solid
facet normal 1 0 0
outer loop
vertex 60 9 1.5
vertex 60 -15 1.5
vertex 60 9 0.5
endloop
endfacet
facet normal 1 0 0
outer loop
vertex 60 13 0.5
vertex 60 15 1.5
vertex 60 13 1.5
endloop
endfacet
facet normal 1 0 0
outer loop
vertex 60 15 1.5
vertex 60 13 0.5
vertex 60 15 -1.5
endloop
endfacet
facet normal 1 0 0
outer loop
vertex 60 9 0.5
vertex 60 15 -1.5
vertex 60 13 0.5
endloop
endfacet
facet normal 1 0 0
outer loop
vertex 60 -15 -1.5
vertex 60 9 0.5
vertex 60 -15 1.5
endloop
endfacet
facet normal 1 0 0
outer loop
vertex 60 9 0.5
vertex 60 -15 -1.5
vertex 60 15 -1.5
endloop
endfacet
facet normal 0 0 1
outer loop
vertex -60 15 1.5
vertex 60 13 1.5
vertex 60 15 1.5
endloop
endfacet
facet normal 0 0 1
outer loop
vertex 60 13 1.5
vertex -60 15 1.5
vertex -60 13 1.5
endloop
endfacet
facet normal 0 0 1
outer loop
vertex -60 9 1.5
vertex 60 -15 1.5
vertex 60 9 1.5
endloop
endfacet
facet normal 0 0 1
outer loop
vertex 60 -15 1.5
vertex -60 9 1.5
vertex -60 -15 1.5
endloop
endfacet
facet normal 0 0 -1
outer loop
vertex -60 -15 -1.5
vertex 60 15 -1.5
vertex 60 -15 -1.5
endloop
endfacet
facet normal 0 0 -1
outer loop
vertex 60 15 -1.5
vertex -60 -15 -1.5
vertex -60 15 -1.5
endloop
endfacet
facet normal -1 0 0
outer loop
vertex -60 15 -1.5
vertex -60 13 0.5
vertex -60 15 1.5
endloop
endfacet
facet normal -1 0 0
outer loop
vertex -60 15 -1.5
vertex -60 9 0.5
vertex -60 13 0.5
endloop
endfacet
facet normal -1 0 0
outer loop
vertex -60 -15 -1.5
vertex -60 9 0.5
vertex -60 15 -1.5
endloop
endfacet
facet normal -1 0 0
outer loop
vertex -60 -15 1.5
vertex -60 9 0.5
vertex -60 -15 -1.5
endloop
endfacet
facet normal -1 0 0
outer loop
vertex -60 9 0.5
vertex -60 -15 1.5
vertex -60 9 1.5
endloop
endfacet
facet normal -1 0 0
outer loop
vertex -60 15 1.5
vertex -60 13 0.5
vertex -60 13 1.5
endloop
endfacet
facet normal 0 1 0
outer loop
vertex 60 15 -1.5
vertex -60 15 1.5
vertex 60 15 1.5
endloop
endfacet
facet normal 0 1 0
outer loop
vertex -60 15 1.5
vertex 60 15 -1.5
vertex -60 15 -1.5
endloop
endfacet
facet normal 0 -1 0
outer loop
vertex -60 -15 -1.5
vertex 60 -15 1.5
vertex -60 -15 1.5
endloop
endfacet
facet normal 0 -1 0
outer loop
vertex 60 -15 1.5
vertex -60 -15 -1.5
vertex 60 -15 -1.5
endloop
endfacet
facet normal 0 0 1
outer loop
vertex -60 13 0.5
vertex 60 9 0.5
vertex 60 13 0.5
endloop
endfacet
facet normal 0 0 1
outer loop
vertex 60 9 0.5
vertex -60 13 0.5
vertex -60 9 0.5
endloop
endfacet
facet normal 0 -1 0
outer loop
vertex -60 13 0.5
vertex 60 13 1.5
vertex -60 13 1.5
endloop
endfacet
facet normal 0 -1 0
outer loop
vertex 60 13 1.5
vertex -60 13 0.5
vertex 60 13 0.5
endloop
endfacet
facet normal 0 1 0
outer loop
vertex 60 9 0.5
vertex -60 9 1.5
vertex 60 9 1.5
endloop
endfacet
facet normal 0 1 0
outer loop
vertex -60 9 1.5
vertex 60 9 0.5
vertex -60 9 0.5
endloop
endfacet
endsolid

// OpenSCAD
module glass(w,d,h) {
  color([1,1,1,0.25])
  cube([w,d,h], center=true);
}

module side1(side, wall_thickness, cut_depth, glass_thickness) {
  depth = 30;
  gap_width = side + 2;
  support_width = 2;
  color([1,0.1,0.0,0.75])
  difference() {
    cube([side,depth,wall_thickness], center=true);
    translate([
      -1,
      depth / 2 - support_width - glass_thickness / 2,
      wall_thickness-cut_depth
    ])
      cube([gap_width,glass_thickness,wall_thickness], center=true);
  }
}

width  = 120;
depth  = 80;
glass_thickness = 4;
wall_thickness = 3;
cut_depth = 1;

//glass(width, depth, glass_thickness);
//rotate([90,00,0])
  side1(width, wall_thickness, cut_depth, glass_thickness);
